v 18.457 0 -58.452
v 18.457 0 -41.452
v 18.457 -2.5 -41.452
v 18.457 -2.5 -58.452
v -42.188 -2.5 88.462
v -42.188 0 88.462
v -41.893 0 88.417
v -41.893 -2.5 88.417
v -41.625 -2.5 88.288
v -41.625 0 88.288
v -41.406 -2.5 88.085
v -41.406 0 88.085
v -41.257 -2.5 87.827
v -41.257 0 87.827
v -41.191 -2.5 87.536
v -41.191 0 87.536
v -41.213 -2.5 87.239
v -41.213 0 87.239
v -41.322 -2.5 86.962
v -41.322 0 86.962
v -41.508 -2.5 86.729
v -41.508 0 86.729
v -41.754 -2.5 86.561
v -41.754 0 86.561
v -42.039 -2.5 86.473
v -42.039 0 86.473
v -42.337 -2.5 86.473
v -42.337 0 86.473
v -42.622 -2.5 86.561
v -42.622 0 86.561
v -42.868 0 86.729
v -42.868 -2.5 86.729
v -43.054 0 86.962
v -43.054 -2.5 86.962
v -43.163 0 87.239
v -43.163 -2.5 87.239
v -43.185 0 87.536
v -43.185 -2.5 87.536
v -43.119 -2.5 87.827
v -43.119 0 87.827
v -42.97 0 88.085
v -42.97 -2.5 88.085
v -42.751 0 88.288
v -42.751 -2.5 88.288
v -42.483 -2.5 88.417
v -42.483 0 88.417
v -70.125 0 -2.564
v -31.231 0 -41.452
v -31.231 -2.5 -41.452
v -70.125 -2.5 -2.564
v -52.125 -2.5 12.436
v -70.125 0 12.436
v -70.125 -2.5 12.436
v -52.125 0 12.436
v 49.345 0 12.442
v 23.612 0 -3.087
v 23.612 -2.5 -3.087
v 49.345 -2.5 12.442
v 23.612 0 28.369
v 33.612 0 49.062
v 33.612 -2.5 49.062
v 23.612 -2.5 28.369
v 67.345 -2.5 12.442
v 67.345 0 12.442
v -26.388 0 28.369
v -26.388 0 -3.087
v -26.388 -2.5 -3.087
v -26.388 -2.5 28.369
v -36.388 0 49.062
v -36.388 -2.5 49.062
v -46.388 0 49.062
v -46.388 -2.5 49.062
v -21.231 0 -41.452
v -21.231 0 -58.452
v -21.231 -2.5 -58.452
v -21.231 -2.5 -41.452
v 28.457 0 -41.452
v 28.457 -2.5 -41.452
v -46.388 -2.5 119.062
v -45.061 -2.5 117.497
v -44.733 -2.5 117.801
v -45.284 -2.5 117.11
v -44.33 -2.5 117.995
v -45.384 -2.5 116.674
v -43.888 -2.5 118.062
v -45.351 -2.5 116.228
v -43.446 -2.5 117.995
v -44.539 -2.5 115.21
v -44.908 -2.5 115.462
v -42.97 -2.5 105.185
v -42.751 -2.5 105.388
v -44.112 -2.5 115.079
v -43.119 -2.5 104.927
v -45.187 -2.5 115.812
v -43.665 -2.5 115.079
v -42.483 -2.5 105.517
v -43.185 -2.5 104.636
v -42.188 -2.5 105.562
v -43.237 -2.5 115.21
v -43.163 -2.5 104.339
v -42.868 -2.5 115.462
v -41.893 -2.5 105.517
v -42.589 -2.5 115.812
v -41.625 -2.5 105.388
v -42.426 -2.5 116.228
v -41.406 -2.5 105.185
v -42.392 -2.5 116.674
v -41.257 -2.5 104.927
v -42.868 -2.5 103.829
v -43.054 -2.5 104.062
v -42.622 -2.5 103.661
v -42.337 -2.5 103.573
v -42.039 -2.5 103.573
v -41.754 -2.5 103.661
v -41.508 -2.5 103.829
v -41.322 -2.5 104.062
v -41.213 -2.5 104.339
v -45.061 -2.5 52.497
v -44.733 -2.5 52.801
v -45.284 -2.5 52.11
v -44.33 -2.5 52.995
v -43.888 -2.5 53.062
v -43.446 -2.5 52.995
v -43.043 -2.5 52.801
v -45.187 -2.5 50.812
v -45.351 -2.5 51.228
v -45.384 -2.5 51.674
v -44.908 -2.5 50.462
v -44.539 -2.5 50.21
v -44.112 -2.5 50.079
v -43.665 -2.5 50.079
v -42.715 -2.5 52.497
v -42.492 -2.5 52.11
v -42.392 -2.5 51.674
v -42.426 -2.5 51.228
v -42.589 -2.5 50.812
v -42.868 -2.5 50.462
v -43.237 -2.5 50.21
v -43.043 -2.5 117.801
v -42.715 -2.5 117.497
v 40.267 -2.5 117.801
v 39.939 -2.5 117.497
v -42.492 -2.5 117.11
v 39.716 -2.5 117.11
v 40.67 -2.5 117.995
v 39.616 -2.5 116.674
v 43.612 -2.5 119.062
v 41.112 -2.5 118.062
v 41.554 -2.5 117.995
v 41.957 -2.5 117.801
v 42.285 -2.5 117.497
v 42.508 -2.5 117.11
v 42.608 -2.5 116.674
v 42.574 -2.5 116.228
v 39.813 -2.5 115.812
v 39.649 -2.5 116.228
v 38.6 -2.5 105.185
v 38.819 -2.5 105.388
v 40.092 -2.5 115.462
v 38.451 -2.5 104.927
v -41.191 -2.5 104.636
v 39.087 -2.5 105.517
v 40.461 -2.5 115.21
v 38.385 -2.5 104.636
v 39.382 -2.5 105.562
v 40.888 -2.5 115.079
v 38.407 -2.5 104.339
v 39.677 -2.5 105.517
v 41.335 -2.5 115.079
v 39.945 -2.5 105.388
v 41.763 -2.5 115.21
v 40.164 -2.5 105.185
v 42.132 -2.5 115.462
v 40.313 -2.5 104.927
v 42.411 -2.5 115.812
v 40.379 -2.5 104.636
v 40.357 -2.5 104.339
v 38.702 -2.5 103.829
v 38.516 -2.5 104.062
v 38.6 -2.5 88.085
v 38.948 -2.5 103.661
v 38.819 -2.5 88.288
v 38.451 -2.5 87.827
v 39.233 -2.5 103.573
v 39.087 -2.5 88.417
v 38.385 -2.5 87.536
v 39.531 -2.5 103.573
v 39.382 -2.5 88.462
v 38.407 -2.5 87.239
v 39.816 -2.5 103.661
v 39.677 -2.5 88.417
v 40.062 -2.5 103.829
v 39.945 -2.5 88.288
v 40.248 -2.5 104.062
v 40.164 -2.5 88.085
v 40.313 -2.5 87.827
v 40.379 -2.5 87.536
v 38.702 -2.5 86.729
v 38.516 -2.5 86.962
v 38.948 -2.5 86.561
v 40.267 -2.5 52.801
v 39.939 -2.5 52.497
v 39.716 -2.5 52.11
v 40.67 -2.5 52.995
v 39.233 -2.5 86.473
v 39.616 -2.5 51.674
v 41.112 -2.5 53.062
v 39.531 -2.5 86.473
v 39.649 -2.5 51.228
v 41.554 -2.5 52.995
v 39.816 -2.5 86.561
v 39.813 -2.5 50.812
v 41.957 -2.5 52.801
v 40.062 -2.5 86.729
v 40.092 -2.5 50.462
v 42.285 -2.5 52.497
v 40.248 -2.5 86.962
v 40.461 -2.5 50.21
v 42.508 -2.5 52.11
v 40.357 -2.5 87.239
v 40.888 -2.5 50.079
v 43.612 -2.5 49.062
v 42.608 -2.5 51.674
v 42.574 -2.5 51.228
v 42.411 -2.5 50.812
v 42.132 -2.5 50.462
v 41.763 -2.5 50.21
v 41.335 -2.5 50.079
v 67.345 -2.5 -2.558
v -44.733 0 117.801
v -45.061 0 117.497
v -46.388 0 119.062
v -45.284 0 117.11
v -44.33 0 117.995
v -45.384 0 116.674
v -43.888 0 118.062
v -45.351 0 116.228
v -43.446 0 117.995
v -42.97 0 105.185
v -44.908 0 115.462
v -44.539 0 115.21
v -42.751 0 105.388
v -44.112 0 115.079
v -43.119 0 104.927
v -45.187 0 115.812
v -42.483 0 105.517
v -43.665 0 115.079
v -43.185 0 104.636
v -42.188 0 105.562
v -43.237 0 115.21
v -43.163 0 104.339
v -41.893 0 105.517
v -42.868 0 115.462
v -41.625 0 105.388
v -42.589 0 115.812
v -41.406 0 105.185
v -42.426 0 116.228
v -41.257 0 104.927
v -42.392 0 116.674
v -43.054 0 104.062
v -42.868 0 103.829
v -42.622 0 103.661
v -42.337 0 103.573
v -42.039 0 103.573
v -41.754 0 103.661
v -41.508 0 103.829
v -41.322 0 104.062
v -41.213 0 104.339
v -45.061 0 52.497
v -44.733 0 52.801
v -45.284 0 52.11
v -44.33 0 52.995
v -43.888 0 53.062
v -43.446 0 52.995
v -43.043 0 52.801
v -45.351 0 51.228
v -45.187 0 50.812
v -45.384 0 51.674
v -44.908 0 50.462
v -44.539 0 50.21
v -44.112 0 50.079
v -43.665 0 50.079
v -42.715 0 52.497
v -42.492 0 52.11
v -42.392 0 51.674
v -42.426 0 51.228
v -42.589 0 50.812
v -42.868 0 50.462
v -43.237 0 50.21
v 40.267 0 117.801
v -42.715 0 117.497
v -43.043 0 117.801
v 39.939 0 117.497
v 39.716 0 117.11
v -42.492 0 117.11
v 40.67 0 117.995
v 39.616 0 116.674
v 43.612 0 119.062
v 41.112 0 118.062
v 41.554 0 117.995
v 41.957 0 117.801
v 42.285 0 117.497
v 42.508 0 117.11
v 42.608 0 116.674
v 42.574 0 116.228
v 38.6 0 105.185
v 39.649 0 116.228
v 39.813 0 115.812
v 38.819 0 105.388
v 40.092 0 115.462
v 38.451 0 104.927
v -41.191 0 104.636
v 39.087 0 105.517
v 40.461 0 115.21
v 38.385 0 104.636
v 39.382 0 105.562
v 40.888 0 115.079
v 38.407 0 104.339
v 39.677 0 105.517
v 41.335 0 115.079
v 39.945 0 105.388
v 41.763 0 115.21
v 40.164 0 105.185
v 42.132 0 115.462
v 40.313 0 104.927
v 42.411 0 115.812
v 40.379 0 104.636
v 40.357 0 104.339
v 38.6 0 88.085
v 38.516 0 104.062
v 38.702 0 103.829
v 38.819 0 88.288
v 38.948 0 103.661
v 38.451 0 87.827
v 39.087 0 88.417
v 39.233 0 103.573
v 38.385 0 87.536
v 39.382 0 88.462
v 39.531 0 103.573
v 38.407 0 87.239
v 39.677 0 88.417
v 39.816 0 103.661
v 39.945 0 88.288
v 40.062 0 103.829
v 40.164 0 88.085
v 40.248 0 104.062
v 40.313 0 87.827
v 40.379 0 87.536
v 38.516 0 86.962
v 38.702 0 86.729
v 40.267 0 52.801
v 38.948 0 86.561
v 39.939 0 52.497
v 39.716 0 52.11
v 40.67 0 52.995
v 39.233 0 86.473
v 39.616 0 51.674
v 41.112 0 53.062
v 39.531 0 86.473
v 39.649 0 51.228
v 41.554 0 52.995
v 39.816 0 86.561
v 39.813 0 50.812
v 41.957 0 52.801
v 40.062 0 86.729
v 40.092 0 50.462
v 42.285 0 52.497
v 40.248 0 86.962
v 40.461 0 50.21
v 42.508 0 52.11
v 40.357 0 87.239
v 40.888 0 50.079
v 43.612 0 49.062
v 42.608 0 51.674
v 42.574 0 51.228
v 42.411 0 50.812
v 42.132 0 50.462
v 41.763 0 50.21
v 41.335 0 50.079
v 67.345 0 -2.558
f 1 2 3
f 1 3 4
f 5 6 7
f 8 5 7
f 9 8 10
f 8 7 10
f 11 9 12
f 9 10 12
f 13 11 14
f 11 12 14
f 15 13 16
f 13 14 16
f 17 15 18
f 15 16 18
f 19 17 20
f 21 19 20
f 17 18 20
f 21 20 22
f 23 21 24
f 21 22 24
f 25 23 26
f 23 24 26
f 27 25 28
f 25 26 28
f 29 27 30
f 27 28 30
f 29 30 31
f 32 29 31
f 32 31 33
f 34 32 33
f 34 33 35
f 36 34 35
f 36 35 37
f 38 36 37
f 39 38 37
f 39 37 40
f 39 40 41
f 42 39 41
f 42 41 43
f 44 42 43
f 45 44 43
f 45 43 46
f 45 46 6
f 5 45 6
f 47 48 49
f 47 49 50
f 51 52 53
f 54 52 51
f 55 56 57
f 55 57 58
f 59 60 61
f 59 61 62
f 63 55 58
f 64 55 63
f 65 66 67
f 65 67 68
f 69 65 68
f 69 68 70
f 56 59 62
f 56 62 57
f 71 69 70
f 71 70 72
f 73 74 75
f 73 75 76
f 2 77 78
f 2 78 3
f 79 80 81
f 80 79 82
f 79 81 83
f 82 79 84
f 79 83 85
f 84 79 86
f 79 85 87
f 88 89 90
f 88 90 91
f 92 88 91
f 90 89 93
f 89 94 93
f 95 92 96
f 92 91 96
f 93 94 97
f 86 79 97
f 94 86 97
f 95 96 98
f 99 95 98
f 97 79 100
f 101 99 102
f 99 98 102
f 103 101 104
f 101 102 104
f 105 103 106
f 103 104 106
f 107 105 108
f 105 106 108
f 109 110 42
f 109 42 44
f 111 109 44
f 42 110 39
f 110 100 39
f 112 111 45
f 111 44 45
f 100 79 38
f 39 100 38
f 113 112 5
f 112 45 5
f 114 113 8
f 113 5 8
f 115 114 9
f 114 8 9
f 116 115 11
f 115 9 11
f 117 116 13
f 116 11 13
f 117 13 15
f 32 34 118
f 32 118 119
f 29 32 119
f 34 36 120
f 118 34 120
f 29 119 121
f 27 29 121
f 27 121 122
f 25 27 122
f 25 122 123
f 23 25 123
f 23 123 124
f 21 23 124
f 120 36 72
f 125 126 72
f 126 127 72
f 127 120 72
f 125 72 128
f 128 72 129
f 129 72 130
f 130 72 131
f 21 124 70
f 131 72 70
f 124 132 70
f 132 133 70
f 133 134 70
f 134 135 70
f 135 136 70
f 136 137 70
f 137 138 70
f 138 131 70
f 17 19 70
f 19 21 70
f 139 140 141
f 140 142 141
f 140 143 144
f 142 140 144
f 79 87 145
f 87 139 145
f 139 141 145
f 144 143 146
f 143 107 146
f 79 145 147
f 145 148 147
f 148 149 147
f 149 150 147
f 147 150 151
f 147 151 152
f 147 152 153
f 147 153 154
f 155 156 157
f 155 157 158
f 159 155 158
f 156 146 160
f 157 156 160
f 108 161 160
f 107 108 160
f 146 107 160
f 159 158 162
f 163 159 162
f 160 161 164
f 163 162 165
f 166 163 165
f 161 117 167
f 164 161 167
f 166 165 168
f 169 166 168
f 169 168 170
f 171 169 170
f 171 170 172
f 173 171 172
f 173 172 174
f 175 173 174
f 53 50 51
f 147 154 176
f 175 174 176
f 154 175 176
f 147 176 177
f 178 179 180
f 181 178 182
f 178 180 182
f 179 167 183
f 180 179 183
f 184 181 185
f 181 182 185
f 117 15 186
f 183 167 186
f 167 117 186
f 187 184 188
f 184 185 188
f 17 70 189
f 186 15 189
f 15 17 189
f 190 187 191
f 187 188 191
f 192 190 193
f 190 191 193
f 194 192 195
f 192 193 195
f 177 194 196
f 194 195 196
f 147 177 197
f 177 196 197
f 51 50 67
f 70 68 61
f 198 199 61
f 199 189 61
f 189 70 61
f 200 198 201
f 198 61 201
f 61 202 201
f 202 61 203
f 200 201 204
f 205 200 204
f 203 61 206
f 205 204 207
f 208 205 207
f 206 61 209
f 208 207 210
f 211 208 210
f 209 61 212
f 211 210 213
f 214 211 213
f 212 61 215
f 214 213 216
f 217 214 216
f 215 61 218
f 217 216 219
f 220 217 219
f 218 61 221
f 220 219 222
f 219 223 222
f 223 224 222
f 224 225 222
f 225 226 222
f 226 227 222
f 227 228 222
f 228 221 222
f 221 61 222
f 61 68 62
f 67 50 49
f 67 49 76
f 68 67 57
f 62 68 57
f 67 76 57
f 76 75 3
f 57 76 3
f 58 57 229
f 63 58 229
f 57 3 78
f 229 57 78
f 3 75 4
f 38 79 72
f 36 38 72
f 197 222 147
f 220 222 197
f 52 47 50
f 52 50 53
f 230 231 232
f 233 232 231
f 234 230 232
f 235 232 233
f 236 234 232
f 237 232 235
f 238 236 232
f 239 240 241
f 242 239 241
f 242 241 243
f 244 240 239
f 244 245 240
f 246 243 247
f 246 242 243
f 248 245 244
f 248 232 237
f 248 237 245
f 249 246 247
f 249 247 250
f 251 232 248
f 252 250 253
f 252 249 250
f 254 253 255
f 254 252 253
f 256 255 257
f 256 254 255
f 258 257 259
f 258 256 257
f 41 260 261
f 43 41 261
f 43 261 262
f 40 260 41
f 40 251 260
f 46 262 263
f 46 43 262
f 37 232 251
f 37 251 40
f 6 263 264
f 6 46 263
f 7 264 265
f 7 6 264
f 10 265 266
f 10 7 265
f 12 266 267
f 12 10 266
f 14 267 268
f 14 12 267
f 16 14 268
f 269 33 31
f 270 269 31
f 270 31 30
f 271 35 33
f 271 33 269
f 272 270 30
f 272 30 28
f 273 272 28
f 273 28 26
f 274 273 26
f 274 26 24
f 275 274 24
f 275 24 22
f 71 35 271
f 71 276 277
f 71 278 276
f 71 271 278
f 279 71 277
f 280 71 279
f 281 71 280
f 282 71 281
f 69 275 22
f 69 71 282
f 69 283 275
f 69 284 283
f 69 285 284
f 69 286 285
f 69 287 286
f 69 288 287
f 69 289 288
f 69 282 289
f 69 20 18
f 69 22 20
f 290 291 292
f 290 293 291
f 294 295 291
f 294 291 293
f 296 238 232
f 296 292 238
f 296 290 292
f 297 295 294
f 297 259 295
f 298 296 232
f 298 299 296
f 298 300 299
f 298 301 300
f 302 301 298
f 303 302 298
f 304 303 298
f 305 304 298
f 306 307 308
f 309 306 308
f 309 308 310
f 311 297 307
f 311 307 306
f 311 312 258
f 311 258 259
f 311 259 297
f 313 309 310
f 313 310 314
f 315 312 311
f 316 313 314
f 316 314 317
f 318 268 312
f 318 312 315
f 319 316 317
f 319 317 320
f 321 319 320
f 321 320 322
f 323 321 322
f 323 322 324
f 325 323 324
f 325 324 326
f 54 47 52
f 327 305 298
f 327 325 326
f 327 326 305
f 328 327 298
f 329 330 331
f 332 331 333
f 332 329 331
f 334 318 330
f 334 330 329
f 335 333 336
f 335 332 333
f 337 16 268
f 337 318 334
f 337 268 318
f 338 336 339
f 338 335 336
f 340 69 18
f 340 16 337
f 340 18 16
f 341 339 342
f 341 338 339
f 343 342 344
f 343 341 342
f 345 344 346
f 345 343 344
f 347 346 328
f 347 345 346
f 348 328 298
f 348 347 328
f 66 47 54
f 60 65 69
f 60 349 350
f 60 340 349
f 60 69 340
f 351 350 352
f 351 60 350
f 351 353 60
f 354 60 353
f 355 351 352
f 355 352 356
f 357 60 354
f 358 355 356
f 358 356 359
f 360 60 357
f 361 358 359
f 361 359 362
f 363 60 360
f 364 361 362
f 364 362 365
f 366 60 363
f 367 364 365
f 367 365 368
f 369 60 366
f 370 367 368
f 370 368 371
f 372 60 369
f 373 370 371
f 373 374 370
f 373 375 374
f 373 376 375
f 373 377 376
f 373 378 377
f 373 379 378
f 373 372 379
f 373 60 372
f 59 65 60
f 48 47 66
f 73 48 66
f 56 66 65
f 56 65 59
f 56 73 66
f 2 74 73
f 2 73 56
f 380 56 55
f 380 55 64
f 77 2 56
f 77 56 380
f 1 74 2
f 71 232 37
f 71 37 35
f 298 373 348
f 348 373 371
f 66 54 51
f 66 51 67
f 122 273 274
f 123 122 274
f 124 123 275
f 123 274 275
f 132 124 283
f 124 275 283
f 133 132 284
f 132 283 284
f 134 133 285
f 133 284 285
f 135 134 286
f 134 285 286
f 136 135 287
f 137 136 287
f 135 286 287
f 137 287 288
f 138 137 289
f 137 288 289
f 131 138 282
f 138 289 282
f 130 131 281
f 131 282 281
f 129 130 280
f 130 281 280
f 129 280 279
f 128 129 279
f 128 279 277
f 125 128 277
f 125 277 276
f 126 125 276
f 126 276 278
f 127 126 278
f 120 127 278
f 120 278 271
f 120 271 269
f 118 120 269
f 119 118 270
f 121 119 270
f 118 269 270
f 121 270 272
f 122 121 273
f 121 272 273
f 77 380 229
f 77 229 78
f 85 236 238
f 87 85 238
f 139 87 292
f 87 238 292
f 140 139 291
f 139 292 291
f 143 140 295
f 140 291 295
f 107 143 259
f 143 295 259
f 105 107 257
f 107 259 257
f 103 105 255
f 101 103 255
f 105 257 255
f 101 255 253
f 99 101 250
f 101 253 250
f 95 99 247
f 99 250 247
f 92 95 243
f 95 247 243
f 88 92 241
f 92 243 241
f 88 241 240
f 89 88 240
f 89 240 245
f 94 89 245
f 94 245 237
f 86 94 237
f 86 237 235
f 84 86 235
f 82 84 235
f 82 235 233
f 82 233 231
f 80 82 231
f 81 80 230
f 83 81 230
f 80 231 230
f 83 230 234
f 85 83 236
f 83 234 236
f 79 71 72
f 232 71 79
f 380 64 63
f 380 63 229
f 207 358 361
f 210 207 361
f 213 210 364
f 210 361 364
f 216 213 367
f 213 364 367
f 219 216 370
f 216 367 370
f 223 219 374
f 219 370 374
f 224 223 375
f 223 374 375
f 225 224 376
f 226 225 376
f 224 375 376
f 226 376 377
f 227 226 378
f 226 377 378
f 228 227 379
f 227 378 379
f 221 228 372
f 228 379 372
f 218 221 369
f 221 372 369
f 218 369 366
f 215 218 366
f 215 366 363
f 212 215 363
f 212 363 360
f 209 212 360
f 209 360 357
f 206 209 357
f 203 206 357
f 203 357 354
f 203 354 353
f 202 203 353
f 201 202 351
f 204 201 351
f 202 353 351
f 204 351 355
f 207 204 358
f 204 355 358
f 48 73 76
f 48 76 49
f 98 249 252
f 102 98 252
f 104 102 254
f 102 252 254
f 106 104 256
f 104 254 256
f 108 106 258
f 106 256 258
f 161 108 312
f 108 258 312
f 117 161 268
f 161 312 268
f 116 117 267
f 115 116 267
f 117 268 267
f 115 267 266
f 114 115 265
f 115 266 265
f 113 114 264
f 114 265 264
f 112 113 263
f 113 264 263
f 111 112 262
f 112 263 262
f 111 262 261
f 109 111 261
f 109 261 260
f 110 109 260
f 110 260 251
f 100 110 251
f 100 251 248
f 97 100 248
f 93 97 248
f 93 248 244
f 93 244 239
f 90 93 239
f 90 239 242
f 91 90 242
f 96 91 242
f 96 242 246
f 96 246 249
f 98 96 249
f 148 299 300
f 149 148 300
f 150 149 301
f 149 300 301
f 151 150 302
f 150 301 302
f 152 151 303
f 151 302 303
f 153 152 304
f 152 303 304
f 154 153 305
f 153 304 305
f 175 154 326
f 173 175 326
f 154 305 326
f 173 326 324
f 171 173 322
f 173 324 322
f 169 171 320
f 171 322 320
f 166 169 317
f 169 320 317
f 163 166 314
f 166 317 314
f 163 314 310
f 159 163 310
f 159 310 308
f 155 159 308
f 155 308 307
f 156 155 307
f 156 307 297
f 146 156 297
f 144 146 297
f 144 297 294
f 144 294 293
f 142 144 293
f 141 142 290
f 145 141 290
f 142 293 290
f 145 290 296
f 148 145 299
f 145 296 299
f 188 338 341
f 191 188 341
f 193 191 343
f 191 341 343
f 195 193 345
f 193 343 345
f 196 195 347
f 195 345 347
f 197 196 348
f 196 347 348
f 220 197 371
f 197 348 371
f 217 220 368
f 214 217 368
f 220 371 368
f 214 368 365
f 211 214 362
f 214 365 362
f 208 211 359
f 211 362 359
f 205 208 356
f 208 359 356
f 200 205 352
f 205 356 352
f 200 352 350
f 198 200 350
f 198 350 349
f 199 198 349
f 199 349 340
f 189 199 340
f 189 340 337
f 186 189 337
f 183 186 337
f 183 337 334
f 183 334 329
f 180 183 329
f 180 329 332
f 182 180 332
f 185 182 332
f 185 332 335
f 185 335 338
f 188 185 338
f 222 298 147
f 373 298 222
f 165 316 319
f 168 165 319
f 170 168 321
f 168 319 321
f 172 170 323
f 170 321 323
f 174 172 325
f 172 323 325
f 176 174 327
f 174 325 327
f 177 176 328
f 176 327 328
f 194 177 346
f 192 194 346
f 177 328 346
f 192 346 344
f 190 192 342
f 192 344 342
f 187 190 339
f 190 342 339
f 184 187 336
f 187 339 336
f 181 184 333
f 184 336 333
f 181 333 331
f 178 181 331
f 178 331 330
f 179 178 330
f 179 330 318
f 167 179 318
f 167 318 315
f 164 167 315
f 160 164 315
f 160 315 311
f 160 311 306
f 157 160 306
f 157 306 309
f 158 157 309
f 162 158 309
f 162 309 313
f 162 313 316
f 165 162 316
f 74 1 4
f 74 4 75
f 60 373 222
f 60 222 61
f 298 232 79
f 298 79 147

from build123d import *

# Parameters (mm, degrees)
SKETCH1_R           = 1.5
BOSS_EXTRUDE1_DEPTH = 2.5
SKETCH2_R           = 1
CUT_EXTRUDE1_DEPTH  = 10
SKETCH3_R           = 1
CUT_EXTRUDE2_DEPTH  = 10


with BuildPart() as part:
    # Sketch1 → Boss-Extrude1 (new body)
    with BuildSketch(Plane(origin=(0, 0, 0), x_dir=(1, 0, 0), z_dir=(0, 1, 0))):
        Polygon((-36.388124659, -49.061762216), (-46.388124659, -49.061762216), (-46.388124659, -119.061762216), (43.611875341, -119.061762216), (43.611875341, -49.061762216), (33.611875341, -49.061762216), (23.611875341, -28.368941333), (23.611875341, 3.086787883), (49.344702977, -12.442380613), (67.344702977, -12.442380613), (67.344702977, 2.557619387), (28.457213072, 41.451875118), (18.457213072, 41.451875118), (18.457213072, 58.451875118), (-21.230778371, 58.451875118), (-21.230778371, 41.451875118), (-31.230778371, 41.451875118), (-70.125034102, 2.564385214), (-70.125034102, -12.435614786), (-52.125034102, -12.435614786), (-26.388124659, 3.086787883), (-26.388124659, -28.368941333), align=None)
        with Locations(Location((41.111875341, -51.561762216, 0), (0, 0, 270))):
            Circle(SKETCH1_R, mode=Mode.SUBTRACT)
        with Locations(Location((-43.888124659, -51.561762216, 0), (0, 0, 270))):
            Circle(SKETCH1_R, mode=Mode.SUBTRACT)
        with Locations(Location((-43.888124659, -116.561762216, 0), (0, 0, 270))):
            Circle(SKETCH1_R, mode=Mode.SUBTRACT)
        with Locations(Location((41.111875341, -116.561762216, 0), (0, 0, 270))):
            Circle(SKETCH1_R, mode=Mode.SUBTRACT)
    extrude(amount=-BOSS_EXTRUDE1_DEPTH)

    # Sketch2 → Cut-Extrude1 (cut)
    with BuildSketch(Plane(origin=(0, 0, 0), x_dir=(1, 0, 0), z_dir=(0, 1, 0))):
        with Locations(Location((-42.188124659, -87.461762216, 0), (0, 0, 270))):
            Circle(SKETCH2_R)
        with Locations(Location((-42.188124659, -104.561762216, 0), (0, 0, 270))):
            Circle(SKETCH2_R)
    extrude(amount=-CUT_EXTRUDE1_DEPTH, mode=Mode.SUBTRACT)

    # Sketch3 → Cut-Extrude2 (cut)
    with BuildSketch(Plane(origin=(0, 0, 0), x_dir=(1, 0, 0), z_dir=(0, 1, 0))):
        with Locations(Location((39.381875341, -87.461762216, 0), (0, 0, 270))):
            Circle(SKETCH3_R)
        with Locations(Location((39.381875341, -104.561762216, 0), (0, 0, 270))):
            Circle(SKETCH3_R)
    extrude(amount=-CUT_EXTRUDE2_DEPTH, mode=Mode.SUBTRACT)


solid = part.part
